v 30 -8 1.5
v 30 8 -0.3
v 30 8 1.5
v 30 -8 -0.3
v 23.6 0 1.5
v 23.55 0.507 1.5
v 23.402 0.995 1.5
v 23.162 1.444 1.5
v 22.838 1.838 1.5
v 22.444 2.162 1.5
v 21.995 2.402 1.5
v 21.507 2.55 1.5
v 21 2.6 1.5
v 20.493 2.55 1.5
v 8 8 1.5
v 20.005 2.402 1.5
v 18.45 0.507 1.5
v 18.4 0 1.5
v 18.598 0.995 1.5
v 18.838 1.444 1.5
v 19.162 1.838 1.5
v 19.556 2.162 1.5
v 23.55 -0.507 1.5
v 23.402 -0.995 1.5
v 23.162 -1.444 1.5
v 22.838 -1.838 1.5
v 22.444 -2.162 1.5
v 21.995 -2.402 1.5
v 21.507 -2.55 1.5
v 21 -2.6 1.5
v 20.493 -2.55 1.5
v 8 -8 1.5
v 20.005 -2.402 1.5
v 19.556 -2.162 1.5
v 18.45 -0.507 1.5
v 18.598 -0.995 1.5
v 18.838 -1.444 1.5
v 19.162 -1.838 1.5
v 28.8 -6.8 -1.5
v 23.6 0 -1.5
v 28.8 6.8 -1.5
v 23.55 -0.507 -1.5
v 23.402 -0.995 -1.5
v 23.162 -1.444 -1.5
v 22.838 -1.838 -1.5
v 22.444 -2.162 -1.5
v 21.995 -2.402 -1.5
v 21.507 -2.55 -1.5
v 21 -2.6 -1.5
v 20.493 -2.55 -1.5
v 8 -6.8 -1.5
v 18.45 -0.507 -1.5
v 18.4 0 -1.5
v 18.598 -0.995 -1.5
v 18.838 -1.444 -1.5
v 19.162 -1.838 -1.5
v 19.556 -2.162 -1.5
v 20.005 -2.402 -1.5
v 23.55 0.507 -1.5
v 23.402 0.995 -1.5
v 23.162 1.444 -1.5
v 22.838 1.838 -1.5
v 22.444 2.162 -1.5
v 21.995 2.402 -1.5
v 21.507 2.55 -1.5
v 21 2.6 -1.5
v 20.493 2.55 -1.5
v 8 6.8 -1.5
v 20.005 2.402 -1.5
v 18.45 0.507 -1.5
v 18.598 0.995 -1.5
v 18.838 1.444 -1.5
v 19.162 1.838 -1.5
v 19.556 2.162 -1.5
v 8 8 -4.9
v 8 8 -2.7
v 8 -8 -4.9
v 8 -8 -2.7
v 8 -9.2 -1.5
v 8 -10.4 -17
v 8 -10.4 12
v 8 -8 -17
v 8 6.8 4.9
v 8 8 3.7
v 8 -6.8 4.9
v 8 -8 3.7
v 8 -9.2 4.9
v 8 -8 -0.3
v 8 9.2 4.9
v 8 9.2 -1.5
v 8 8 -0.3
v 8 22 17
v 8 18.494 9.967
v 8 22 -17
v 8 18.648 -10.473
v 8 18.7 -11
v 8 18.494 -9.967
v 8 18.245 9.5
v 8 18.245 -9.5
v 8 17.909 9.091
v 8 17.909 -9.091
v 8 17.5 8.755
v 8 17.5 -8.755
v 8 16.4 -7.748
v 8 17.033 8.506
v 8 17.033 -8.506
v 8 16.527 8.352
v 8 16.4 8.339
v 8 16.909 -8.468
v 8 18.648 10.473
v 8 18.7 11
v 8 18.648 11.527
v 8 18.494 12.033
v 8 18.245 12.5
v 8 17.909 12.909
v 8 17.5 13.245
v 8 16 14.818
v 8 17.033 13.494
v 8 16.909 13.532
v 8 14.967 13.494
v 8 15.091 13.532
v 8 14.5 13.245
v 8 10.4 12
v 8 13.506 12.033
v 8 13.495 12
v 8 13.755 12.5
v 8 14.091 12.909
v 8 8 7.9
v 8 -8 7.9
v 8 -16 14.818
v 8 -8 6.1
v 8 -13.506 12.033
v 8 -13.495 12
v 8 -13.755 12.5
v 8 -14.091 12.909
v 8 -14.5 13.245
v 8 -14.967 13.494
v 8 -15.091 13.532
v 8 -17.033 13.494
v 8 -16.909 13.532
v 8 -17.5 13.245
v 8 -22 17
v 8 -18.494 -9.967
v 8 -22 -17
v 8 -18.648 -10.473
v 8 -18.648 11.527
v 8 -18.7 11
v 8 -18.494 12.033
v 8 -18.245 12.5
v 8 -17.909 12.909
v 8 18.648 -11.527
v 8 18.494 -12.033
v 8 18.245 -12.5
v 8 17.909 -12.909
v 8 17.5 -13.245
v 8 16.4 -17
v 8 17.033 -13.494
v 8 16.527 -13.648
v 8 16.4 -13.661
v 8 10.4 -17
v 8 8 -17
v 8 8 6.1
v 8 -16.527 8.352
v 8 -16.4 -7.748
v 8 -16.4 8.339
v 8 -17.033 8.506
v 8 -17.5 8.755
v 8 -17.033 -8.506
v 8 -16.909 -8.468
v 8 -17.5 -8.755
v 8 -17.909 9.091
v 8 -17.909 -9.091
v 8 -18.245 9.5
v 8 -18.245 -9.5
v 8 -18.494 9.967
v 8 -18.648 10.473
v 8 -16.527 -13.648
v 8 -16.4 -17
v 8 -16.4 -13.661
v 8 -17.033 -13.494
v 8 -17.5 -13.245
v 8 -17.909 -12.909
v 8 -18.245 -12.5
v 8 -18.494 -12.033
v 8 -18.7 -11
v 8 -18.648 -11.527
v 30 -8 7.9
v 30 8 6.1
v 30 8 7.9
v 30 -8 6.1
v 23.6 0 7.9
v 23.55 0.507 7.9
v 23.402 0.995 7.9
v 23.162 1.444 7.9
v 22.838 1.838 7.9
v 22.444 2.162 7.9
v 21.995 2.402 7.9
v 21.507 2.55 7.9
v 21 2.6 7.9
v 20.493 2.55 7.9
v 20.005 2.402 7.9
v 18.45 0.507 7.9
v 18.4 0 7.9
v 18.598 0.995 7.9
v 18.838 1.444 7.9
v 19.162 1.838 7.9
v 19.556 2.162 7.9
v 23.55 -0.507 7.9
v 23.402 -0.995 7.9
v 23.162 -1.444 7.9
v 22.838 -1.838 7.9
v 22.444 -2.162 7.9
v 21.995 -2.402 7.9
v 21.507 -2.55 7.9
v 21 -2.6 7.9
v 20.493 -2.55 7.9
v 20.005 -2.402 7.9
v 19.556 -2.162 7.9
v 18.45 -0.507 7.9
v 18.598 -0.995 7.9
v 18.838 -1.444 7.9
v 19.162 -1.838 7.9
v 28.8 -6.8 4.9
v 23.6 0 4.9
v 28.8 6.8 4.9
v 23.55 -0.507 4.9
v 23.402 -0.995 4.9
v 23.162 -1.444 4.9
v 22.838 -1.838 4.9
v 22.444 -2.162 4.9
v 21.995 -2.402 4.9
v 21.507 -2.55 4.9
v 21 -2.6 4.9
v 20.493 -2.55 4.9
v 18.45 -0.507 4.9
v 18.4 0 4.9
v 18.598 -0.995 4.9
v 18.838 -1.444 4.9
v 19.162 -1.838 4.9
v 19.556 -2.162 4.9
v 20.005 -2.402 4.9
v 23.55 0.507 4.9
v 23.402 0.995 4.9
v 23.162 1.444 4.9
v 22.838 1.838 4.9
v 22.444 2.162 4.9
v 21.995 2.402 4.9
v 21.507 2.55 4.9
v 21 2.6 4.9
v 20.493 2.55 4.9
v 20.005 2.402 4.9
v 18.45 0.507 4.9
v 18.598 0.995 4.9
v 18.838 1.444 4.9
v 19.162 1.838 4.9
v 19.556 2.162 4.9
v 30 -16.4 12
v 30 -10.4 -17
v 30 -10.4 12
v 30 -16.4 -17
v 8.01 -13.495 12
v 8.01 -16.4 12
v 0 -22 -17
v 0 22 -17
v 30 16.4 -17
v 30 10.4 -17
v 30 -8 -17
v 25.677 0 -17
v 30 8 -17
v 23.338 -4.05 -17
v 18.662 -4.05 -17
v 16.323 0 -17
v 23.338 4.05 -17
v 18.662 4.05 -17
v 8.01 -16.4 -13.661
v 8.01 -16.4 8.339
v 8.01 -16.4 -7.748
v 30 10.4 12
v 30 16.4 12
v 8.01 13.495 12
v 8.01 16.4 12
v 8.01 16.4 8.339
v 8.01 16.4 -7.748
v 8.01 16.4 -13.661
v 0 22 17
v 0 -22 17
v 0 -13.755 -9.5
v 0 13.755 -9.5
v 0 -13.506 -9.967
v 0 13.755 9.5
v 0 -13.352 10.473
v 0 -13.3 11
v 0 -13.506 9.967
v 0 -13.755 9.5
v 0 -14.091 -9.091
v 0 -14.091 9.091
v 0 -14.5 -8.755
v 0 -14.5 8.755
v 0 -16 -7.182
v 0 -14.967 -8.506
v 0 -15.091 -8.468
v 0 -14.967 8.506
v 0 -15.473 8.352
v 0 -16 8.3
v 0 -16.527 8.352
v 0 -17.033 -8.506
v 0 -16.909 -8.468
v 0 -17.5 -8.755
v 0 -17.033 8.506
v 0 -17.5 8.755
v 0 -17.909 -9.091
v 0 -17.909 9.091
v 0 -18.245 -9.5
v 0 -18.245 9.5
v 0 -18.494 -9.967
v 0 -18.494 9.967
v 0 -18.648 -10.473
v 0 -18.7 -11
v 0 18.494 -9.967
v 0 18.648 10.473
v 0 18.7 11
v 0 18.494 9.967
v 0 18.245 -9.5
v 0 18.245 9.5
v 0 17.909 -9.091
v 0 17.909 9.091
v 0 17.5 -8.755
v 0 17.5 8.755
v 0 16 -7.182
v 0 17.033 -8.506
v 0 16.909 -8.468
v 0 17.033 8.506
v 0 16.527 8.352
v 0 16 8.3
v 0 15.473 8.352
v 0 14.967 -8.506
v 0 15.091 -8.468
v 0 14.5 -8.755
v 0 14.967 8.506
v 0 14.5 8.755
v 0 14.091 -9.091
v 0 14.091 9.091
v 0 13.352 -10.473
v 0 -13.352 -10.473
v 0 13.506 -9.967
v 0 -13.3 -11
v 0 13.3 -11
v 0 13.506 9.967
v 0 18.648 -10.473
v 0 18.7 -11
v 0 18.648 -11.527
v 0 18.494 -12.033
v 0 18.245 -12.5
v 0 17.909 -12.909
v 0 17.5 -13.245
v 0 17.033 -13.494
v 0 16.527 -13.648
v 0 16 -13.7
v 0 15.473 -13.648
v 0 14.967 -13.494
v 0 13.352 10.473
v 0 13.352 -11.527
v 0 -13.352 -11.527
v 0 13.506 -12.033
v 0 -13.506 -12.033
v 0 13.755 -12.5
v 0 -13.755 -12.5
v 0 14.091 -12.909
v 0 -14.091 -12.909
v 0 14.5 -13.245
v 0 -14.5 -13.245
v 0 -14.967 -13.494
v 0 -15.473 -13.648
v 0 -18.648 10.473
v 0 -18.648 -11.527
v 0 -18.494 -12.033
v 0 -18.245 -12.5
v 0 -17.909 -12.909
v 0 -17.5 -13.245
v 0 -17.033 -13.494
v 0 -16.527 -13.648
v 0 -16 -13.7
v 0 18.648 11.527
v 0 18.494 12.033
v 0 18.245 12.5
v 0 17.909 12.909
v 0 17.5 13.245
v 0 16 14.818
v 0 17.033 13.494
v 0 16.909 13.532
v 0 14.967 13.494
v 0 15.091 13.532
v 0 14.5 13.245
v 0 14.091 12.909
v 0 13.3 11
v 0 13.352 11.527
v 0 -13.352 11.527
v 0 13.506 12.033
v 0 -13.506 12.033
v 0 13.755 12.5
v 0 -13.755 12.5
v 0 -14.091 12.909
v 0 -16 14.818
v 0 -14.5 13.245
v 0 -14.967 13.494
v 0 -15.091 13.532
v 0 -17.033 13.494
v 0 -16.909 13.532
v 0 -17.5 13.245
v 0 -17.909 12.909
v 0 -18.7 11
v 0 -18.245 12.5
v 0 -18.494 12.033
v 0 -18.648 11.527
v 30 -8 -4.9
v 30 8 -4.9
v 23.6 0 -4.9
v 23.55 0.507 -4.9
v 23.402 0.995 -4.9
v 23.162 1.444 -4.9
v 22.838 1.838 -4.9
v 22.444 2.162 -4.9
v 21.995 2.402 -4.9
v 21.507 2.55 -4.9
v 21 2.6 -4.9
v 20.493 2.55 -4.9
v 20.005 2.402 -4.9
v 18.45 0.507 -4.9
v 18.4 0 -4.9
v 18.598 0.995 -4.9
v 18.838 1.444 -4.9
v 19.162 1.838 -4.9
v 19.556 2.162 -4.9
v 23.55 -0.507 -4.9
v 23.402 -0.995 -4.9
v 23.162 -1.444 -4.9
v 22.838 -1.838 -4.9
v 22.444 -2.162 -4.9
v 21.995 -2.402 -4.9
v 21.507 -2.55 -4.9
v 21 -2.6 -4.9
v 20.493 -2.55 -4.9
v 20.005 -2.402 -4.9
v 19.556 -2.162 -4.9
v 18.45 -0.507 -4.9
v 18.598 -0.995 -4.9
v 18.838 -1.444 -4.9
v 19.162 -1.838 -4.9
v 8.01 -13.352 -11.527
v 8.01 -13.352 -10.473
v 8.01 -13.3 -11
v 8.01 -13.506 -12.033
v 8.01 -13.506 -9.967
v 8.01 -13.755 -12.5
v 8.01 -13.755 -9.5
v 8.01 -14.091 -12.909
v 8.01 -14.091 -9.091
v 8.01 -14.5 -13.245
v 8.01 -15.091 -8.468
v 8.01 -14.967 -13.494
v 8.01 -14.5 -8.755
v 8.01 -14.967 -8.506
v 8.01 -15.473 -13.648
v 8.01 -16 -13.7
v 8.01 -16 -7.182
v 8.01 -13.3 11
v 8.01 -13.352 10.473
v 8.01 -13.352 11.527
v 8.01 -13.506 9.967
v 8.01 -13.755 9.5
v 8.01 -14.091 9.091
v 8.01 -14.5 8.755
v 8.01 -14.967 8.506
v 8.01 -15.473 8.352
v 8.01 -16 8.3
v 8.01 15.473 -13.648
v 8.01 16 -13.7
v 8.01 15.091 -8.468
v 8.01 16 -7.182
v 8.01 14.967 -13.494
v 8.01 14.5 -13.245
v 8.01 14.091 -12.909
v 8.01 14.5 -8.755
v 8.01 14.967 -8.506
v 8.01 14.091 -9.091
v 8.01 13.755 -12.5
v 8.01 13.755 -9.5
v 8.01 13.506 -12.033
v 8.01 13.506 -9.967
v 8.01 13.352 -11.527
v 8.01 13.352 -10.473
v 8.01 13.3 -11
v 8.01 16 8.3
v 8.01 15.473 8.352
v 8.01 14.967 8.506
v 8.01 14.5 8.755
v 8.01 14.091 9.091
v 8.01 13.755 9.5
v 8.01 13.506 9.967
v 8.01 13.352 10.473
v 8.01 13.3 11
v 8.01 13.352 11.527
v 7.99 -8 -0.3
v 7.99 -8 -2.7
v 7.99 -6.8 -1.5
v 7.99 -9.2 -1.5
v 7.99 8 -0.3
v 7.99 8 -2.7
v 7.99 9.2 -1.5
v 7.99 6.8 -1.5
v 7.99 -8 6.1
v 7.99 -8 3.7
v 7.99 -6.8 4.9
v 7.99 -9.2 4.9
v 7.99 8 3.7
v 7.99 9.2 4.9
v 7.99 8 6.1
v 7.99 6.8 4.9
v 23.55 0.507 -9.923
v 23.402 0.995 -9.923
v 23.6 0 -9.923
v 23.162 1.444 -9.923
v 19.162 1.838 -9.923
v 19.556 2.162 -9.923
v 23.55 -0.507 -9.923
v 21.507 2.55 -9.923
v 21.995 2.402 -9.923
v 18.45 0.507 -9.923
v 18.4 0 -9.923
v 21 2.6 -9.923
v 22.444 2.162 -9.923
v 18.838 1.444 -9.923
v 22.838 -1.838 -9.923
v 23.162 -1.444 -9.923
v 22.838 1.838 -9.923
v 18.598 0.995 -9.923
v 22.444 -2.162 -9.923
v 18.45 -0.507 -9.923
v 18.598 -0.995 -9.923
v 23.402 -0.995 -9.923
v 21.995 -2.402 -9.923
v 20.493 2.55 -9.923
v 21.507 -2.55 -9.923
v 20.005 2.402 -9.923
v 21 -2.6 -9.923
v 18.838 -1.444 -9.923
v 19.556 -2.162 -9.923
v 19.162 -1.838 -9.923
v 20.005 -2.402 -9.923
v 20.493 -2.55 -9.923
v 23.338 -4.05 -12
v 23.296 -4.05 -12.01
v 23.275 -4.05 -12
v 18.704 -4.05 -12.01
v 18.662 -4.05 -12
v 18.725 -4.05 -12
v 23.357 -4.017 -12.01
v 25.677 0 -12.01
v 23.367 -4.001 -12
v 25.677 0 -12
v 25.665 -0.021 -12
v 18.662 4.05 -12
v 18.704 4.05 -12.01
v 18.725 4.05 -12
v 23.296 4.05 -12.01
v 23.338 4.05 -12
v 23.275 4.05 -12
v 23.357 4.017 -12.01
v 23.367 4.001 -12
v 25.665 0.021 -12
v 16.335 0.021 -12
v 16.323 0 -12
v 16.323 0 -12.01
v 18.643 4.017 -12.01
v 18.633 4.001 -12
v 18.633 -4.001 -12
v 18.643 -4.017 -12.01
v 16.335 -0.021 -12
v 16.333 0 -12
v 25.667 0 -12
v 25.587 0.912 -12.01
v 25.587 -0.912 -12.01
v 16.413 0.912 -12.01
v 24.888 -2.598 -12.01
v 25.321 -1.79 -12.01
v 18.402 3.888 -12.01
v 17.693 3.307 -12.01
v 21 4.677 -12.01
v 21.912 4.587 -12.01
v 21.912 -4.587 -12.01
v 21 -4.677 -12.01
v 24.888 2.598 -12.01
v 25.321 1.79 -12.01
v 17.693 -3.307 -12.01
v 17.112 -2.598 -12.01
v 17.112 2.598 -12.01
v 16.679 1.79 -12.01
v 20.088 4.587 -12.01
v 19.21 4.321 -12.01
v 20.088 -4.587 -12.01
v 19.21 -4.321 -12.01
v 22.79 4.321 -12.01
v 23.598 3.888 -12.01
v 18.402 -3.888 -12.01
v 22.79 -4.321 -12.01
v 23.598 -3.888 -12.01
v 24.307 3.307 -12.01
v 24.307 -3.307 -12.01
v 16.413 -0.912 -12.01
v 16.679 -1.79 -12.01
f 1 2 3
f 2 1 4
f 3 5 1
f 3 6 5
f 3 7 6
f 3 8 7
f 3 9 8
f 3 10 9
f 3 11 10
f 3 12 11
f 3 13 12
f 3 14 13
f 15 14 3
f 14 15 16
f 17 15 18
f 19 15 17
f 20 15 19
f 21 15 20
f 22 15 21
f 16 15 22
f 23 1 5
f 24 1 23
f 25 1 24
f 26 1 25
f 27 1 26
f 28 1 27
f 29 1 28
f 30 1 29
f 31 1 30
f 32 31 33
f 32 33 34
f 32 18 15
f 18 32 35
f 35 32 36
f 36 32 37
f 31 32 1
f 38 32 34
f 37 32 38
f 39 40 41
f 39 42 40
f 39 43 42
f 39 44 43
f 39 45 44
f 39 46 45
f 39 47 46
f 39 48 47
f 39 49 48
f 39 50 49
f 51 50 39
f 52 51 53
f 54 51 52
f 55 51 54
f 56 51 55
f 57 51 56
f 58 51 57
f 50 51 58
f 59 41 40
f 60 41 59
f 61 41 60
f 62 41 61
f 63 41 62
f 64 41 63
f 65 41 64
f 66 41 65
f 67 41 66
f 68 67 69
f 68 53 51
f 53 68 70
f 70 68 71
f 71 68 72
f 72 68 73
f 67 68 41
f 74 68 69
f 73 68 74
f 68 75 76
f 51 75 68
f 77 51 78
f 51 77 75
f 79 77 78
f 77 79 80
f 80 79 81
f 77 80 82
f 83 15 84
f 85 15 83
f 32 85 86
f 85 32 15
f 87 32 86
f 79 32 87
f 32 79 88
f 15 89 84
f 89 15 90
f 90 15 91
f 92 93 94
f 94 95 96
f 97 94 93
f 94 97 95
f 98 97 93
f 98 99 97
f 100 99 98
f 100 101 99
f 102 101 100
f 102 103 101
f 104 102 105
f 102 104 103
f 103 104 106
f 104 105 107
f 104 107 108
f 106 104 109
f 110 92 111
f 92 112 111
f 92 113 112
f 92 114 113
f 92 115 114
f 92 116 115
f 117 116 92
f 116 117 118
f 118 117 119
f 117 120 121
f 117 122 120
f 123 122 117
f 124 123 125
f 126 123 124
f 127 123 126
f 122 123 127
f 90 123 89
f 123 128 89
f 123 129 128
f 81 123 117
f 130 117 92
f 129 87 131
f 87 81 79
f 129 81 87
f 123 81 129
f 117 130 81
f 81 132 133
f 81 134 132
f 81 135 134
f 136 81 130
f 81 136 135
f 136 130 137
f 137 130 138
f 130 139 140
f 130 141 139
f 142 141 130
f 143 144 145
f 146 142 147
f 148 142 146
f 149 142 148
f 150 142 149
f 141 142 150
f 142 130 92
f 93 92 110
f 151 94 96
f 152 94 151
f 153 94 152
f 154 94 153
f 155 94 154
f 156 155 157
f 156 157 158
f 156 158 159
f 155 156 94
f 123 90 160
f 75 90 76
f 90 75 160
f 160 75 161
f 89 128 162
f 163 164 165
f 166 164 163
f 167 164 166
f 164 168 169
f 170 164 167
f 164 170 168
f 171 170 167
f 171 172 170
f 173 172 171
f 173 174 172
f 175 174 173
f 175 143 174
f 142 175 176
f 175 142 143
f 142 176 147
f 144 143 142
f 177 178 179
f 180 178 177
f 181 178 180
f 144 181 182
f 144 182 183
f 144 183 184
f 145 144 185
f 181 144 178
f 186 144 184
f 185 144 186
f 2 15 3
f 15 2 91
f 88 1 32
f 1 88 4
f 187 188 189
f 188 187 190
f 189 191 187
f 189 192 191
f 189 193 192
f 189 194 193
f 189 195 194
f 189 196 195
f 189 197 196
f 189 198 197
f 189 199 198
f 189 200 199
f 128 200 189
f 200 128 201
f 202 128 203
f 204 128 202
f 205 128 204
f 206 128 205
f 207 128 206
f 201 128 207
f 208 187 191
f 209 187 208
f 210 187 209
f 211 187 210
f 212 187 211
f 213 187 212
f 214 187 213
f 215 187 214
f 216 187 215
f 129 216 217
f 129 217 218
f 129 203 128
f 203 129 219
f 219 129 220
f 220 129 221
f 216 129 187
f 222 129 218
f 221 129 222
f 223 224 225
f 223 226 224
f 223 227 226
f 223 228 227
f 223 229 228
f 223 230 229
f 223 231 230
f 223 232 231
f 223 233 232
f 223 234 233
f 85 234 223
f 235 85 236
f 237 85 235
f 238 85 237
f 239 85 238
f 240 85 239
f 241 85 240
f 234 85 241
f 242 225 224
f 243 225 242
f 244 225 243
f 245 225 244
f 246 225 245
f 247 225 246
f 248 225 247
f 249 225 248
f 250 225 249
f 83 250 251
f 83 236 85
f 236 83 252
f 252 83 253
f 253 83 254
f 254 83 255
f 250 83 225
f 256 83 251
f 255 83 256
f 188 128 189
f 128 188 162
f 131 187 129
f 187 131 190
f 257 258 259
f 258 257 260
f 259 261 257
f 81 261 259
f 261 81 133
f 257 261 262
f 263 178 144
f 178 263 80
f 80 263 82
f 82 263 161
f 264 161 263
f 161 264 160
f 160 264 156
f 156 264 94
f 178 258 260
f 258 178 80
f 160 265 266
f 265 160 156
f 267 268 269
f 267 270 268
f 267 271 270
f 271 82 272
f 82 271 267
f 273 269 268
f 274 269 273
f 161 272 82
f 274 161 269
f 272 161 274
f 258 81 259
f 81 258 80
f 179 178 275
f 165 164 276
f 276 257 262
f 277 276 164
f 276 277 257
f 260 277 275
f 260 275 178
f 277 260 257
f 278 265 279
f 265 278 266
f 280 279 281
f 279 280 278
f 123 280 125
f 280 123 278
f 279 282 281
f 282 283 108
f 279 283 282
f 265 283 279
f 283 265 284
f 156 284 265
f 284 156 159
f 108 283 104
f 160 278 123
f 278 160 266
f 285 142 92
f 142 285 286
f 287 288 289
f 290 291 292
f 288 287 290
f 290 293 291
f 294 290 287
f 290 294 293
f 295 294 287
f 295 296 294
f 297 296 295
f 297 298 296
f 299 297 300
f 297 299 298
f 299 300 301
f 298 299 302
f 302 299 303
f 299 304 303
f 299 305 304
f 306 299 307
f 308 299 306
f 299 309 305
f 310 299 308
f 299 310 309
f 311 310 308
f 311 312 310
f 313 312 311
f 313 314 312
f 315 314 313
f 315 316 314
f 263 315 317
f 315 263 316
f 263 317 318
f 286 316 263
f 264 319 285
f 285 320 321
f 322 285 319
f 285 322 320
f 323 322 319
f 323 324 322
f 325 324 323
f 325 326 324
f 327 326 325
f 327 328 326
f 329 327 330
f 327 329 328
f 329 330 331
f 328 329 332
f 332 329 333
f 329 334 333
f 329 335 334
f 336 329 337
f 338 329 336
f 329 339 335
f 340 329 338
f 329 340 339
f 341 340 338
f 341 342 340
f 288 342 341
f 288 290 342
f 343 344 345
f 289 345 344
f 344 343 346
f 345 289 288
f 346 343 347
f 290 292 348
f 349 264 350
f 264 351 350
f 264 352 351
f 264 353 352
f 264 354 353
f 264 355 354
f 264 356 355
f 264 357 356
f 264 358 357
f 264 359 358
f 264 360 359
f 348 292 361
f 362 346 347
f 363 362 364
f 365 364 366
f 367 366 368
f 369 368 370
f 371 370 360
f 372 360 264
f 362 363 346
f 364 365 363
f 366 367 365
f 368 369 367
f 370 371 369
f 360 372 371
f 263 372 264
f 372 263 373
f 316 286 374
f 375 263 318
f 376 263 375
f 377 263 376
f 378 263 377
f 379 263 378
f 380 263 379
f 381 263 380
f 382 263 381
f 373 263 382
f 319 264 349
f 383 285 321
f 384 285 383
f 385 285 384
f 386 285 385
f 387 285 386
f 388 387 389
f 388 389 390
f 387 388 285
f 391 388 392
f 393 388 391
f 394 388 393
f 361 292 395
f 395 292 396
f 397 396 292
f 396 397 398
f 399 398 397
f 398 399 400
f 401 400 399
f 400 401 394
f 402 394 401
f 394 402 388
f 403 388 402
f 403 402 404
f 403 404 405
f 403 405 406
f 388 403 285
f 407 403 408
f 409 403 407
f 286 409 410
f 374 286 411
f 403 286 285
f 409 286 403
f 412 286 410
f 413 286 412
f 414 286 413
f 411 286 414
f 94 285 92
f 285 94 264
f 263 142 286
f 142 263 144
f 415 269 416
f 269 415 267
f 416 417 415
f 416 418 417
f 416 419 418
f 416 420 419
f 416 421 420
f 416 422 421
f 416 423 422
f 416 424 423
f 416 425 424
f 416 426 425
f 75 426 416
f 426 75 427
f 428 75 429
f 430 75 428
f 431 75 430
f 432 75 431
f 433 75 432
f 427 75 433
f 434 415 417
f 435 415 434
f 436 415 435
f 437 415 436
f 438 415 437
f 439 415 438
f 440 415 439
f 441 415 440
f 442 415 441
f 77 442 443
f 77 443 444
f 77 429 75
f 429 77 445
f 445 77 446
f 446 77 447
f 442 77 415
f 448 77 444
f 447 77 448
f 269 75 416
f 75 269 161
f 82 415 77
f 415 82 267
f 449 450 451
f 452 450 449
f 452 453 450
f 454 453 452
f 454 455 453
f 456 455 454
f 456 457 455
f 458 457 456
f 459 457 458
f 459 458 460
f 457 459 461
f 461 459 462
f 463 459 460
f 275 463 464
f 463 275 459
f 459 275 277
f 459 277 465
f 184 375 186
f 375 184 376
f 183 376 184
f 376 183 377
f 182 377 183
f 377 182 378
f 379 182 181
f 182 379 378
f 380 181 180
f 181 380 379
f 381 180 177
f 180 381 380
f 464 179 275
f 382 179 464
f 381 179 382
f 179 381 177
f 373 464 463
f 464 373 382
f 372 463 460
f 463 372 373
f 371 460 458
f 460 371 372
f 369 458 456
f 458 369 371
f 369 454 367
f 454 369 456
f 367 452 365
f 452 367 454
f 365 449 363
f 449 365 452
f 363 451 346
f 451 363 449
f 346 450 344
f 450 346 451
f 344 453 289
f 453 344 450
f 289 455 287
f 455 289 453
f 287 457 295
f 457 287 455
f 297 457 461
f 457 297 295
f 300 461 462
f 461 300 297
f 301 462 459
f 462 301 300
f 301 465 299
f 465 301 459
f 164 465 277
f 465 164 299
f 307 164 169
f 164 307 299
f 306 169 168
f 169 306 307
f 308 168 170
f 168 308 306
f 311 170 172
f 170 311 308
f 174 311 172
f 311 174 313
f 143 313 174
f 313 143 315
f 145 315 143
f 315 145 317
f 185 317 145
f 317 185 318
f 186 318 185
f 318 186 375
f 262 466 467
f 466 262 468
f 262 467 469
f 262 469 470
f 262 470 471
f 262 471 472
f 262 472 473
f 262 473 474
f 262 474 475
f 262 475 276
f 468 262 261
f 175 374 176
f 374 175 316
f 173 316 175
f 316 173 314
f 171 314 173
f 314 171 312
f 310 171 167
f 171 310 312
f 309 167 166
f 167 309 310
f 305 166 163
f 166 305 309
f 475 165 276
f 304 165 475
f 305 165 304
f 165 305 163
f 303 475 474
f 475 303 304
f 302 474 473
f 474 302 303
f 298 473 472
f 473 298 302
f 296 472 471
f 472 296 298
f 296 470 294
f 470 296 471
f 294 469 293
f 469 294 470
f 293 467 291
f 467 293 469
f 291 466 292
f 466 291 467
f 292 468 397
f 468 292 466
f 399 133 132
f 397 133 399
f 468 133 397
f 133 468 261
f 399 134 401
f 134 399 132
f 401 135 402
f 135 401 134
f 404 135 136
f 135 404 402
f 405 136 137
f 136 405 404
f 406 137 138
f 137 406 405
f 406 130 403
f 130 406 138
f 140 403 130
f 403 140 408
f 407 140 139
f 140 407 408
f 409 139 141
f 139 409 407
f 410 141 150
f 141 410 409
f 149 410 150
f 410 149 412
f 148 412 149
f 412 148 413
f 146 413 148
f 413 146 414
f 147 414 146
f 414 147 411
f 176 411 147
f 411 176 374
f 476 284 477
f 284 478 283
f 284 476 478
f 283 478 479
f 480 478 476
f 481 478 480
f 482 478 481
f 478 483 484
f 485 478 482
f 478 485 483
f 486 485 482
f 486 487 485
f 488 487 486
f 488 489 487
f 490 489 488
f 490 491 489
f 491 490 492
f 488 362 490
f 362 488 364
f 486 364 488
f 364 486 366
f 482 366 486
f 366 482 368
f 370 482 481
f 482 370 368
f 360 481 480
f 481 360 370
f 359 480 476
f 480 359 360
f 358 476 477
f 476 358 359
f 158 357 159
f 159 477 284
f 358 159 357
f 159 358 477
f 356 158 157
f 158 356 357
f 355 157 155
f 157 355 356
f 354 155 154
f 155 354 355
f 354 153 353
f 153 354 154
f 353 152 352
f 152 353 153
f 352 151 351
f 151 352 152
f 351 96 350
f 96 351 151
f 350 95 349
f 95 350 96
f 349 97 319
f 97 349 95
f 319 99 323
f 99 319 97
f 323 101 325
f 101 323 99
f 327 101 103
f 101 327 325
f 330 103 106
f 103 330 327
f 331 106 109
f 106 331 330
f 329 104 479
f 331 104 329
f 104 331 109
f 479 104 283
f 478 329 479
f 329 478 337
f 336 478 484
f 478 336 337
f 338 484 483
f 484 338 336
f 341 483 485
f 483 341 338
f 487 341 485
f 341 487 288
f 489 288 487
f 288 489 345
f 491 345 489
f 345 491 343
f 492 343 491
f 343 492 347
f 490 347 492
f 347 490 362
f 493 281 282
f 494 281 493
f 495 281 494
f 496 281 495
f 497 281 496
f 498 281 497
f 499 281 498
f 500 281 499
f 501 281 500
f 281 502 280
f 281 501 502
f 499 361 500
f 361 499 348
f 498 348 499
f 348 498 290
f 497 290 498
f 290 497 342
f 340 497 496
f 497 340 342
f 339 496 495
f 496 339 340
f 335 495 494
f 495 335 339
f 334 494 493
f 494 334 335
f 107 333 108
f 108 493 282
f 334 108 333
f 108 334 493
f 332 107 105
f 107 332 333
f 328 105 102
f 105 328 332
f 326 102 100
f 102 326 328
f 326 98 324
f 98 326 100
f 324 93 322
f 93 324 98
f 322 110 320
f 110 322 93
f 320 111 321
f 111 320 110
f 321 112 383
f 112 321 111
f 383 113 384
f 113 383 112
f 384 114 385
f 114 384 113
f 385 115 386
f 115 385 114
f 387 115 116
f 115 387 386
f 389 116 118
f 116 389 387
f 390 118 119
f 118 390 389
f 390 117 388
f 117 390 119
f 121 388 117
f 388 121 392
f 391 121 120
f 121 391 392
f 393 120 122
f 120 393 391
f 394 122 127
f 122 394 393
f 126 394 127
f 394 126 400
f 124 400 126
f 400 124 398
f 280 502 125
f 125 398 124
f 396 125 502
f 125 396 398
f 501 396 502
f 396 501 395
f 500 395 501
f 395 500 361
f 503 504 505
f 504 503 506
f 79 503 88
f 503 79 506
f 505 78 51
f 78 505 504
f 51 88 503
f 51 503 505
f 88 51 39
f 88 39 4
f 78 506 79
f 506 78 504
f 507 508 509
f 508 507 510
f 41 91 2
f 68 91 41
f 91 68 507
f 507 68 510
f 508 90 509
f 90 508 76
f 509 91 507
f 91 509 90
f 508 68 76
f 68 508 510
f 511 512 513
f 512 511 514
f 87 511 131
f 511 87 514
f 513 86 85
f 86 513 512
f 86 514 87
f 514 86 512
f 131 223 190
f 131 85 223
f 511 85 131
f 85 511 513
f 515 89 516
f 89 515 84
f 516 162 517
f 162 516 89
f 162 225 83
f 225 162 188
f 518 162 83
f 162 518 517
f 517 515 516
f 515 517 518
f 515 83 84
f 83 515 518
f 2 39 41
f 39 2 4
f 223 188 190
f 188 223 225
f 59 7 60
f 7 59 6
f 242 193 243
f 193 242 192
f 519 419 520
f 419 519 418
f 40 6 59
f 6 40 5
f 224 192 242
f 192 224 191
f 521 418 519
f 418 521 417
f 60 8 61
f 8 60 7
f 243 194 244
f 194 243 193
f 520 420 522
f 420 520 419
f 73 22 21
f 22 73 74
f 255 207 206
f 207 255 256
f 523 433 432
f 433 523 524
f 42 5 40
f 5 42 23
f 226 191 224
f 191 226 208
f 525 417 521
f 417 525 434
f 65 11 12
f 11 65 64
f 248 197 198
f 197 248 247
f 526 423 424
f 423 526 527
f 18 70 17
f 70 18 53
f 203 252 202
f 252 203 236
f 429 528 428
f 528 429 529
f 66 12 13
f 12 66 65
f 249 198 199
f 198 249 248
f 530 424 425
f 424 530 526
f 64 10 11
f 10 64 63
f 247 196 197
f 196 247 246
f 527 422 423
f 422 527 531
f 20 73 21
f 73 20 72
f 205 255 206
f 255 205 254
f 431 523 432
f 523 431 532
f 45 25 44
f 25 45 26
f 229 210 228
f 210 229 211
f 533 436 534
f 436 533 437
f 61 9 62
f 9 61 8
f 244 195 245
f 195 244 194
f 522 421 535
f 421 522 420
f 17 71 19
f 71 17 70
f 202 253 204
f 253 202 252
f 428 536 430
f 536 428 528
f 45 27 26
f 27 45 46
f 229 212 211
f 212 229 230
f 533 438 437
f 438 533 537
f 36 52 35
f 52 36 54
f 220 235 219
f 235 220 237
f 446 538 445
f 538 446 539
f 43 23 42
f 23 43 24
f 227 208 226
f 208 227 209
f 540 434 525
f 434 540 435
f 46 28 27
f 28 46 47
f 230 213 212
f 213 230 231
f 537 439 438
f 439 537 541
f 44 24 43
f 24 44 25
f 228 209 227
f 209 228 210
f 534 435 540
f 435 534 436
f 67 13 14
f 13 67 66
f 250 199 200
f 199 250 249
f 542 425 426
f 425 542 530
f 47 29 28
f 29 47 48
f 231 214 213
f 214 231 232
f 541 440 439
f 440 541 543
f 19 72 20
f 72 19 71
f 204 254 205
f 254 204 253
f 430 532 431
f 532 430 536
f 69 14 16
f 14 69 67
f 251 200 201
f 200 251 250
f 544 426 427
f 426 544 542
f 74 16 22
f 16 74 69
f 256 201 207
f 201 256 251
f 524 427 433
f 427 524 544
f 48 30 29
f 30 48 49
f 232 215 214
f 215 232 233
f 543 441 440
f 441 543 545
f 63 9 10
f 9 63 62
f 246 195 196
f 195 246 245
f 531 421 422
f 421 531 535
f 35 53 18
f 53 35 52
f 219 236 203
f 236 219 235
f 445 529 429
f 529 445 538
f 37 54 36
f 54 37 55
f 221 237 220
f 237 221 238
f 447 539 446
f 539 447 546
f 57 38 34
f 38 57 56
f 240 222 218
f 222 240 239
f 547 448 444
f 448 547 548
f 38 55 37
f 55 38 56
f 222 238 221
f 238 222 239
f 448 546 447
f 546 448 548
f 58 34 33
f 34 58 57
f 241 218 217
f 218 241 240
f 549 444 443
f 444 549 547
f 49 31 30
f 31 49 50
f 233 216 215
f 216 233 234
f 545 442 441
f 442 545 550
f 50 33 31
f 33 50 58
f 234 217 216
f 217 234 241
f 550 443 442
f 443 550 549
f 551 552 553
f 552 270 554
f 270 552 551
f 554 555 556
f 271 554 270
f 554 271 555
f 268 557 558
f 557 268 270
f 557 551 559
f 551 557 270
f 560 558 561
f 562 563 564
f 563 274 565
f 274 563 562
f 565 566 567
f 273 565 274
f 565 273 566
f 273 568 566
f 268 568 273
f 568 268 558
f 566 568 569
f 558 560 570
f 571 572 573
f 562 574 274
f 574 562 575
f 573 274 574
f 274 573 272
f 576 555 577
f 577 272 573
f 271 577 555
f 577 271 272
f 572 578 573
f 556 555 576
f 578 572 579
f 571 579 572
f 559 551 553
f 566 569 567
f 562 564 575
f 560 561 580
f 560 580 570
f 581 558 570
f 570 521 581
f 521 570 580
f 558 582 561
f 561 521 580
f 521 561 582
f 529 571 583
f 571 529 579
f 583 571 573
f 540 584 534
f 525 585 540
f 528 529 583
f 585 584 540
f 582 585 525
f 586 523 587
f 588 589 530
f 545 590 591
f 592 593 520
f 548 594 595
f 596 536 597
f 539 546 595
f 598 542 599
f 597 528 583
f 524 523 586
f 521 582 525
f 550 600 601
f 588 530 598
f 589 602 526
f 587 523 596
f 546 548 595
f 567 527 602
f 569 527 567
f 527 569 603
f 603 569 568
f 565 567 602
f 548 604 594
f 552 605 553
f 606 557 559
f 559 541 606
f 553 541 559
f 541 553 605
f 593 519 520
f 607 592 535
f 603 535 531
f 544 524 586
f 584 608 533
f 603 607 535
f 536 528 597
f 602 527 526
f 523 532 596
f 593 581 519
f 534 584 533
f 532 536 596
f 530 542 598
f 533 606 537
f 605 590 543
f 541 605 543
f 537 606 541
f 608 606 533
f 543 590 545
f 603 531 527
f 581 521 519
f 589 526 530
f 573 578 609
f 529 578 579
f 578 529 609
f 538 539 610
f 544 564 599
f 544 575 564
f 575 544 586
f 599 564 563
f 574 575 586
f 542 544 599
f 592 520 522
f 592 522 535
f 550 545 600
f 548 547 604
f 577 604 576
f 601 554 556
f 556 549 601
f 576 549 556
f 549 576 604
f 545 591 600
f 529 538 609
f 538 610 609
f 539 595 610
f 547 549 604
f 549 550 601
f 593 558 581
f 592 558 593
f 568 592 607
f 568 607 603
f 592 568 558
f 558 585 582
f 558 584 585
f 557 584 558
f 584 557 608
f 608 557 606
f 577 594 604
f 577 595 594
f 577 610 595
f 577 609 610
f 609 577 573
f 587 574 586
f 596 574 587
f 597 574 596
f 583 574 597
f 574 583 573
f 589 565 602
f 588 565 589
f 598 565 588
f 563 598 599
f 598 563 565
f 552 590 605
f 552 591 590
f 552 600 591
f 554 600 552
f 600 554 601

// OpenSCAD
// =====================================================================
// child_cam_mount.scad — 子機 カメラマウント (縦向き防水ケース用)
//
// DJI Osmo Action 6 を純正防水ケースに入れたまま「縦向き (ポートレート)」に
// 保持する小部品。ケース底面の DJI クイックリリース デュアルタブ
// (GoPro 2 フィンガー互換) を本部品の 3 フィンガーで受け、M5 ボルト 1 本で
// 締結する。ケース底面はフィンガー脇の 2 本の柱の前面 (レジスタ面) に
// 突き当たり、ヨー/ピッチの再現性を出す。
//
// 縦向き配置: ケース底面 (タブ側) は機体中心を向く (内向き)。左右のカメラで
// 同一部品を使う (本部品は y=0 面に対して対称)。
// コアフレーム側インタフェース: 背面プレートの M5 ×4 (y=±16, z=±11)。
//
// ★ 寸法はすべて公称/推定の仮値 (2026-08-02 ユーザ指示: 実測は後日)。
//   実測後に [防水ケース] ブロックを置換して再ビルドすること。
//
// 座標系 (部品ローカル): +X = ケース側 (機体では内→外)、+Y = 前 (レンズ向き)、
//   +Z = 上。背面プレートの背面が x=0。
// 印刷向き: このまま (z=-17 の底面をベッドへ)。フィンガーの間隙 3.4mm は
//   16mm ブリッジで printable (タブ側クリアランス 0.4 が垂れを吸収)。
//   荷重 (カメラ慣性によるフィンガー曲げ) の引張は XY 面内。
// 荷重ケース: L2 輸送 = カメラ+ケース 0.26 kg × 10g ≈ 26 N (全方向)。
//   quick_strength beam (b=48,t=3,L=20,F=30): 8.3 MPa / 許容 12 → PASS
//   quick_strength lug  (hole=5.2,t=9,F=60): 面圧 1.3 MPa → PASS
// =====================================================================

/* [防水ケース (公称・仮値 — 要実測)] */
case_w    = 94.7;    // ケース幅 (縦向きでは Z 方向 = 上下)
case_h    = 84.1;    // ケース高さ (縦向きでは X 方向 = 基線方向)
case_d    = 45.9;    // ケース奥行 (レンズ軸 Y 方向)
lens_off_bot = 42.05; // レジスタ面 (fin_x1, ケース底面の突き当て) →レンズ軸の距離。
                      // 仮 = case_h/2。要実測。★横向き搭載 (child_cam_bridge) でも
                      // 同じ定義で使う (デッキ高さ導出は bridge 側で
                      // deck_top = lens_z - lens_off_bot - fin_x1 として計算する)

/* [クイックリリース タブ (GoPro 互換想定・仮値 — 要実測)] */
tab_t     = 3.0;     // ケース側タブ 1 枚の厚さ
tab_w     = 16.0;    // タブ幅 (Y 方向)
tab_len   = 18.0;    // ケース底面からのタブ突出量
tab_hole_off = 9.0;  // ケース底面 → タブ穴中心の距離 (仮)
tab_clr   = 0.4;     // タブ厚に対する間隙の遊び

/* [フィンガー] */
fin_t     = 3.0;     // 本部品フィンガー厚
fin_w     = 16.0;    // フィンガー幅 (Y)
fin_len   = 22.0;    // フィンガー長 (X)。タブ 18 より長くして頭の逃げを作る
bolt_d    = 5.2;     // M5 通し
hex_af    = 8.1;     // M5 ナットトラップ 二面幅 (+0.1)
hex_dep   = 5.0;

/* [背面プレート (コアフレームへ M5 ×4)] */
plate_t   = 8.0;
plate_hw  = 22.0;    // 半幅 (Y)
plate_hh  = 17.0;    // 半高 (Z)
fh_y      = 16.0;    // フレーム穴 Y 位置 (±)
fh_z      = 11.0;    // フレーム穴 Z 位置 (±)
m5_d      = 5.4;     // M5 クリアランス

/* [レジスタ柱 (ケース底面の突き当て)] */
post_w    = 6.0;     // 柱の幅 (Y)
post_gap  = 2.4;     // フィンガー側面 → 柱内面のクリアランス
post_top  = 12.0;    // 柱の上端 z

/* [機体レベル検査 (仮値)] */
base_line = 150.0;   // ステレオ基線
env_half  = 140.0;   // 全幅 280 の半分 (2026-09-04 子機外装_改善要件 C5/C8: 250→280 に緩和)
bumper_min = 5.0;    // 外側に残す保護構造の最小代 (旧・縦向き検査用、現在は未使用)
bumper_t  = 9.0;     // child_side_bumper の板厚 (二重定義: child_side_bumper.scad と揃える)

/* [Hidden] */
fudge = 0.01;

// ---- 導出値 ---------------------------------------------------------
gap_t    = tab_t + tab_clr;               // フィンガー間隙 3.4
fin_x0   = plate_t;                       // フィンガー根元
fin_x1   = plate_t + fin_len;             // フィンガー先端 = レジスタ面
bolt_x   = fin_x1 - tab_hole_off;         // タブ穴と揃う M5 位置
stack_h  = 3*fin_t + 2*gap_t;             // 15.8
fin_zc   = [-(fin_t+gap_t), 0, fin_t+gap_t]; // フィンガー中心 z (-6.4/0/+6.4)
ped_top  = fin_zc[0] - fin_t/2;           // 台座上面 = 最下フィンガー下面 (-7.9)
post_y0  = fin_w/2 + post_gap;            // 柱内面 (10.4)
post_y1  = post_y0 + post_w;              // 柱外面 (16.4)
head_d   = 16.0;                          // M5 ノブ頭の想定径 (工具レス)
cam_outer = base_line/2 + (case_h - lens_off_bot); // レンズ外側のケース張り出し

// ---- 干渉・成立性チェック -------------------------------------------
assert(gap_t >= tab_t + 0.3,               "フィンガー間隙がタブ厚+0.3を下回る");
assert(fin_len > tab_len + 2,              "フィンガーがタブより短い (頭の逃げ不足)");
assert(bolt_x - head_d/2 > plate_t + 1,    "M5 ノブ頭が背面プレートに当たる");
assert(fin_w/2 - bolt_d/2 >= 2,            "フィンガーの穴縁距離 < 2mm");
assert(fin_w/2 > hex_af/2 + 2,             "ナットトラップの側壁 < 2mm");
assert(plate_hw - fh_y >= m5_d,            "フレーム穴の Y 端距離不足");
assert(plate_hh - fh_z >= m5_d,            "フレーム穴の Z 端距離不足");
assert(post_y1 <= plate_hw,                "レジスタ柱がプレートからはみ出す");
assert(case_d/2 <= plate_hw + 1,           "ケース底面が柱で受けきれない (目安)");
// 250 枠検査 (縦向き搭載時代のもの) は横向き復帰 (C8) により無効。
// 280 枠検査 (横向き, 2026-09-04 改善要件 §1 C5/C8, §3.2):
//   base_line/2 + case_w/2 + bumper_t <= env_half
assert(base_line/2 + case_w/2 + bumper_t <= env_half,
       "横向き搭載でケース+側面バンパが 280 枠を超える");
echo(str("機体でのケース外側張り出し |X| (横向き, バンパ込み) = ",
         base_line/2 + case_w/2 + bumper_t, " (枠 ", env_half, ")"));
echo(str("レジスタ面のグローバル |X| = ", base_line/2 - lens_off_bot,
         " → プレート背面 |X| = ", base_line/2 - lens_off_bot - fin_x1));

// ---- モジュール -----------------------------------------------------
cham = 1.2;   // フィンガー下面縁の 45° 面取り (オーバーハング面積の削減)

// 稜線上のダイヤモンド断面カッター (軸 = X)。稜の両面に c の 45° 面取りを作る
module edge_cham_x(len, c) {
    s = c * sqrt(2);
    rotate([45, 0, 0]) translate([0, -s/2, -s/2]) cube([len, s, s]);
}
// 同、軸 = Y
module edge_cham_y(len, c) {
    s = c * sqrt(2);
    rotate([0, 45, 0]) translate([-s/2, 0, -s/2]) cube([s, len, s]);
}

// 水平穴 (軸 +X) のティアドロップ: 45° 屋根で自己支持にする (サポートレス規約)
module td_hole_x(d, h) {
    r = d/2;
    rotate([0, 90, 0]) linear_extrude(height = h)
        union() {
            circle(r = r, $fn = 32);
            polygon([[-1.414*r, 0], [0, r], [0, -r]]);
        }
}

// ---- 形状 -----------------------------------------------------------
difference() {
    union() {
        // 背面プレート
        translate([0, -plate_hw, -plate_hh])
            cube([plate_t, 2*plate_hw, 2*plate_hh]);
        // 台座 (最下フィンガーを兼ねてベッドまで下ろす)
        translate([fin_x0, -fin_w/2, -plate_hh])
            cube([fin_len, fin_w, ped_top + plate_hh + fin_t]);
        // 中・上フィンガー
        for (i = [1, 2])
            translate([fin_x0, -fin_w/2, fin_zc[i] - fin_t/2])
                cube([fin_len, fin_w, fin_t]);
        // レジスタ柱 ×2 (前面 = ケース底面の突き当て面)
        for (s = [-1, 1])
            translate([fin_x0, s == 1 ? post_y0 : -post_y1, -plate_hh])
                cube([fin_len, post_w, post_top + plate_hh]);
    }
    // フレーム M5 ×4 (ティアドロップ: 横穴の天井を 45° に)
    for (sy = [-1, 1], sz = [-1, 1])
        translate([-fudge, sy*fh_y, sz*fh_z])
            td_hole_x(m5_d, plate_t + 2*fudge);
    // タブ M5 (垂直通し)
    translate([bolt_x, 0, -plate_hh - fudge])
        cylinder(d = bolt_d, h = 2*plate_hh + 2*fudge, $fn = 32);
    // 中・上フィンガー下面の縁を 45° 面取り (±Y の稜と先端 +X の稜)
    for (i = [1, 2]) {
        zb = fin_zc[i] - fin_t/2;
        for (s = [-1, 1])
            translate([fin_x0 - fudge, s*fin_w/2, zb])
                edge_cham_x(fin_len + 2*fudge, cham);
        translate([fin_x1, -fin_w/2 - fudge, zb])
            edge_cham_y(fin_w + 2*fudge, cham);
    }
    // ナットトラップ (底面)。天井は 45° コーンで自己支持にする
    translate([bolt_x, 0, -plate_hh - fudge])
        cylinder(d = hex_af / cos(30), h = hex_dep + fudge, $fn = 6);
    translate([bolt_x, 0, -plate_hh + hex_dep - fudge])
        cylinder(d1 = hex_af / cos(30), d2 = bolt_d,
                 h = (hex_af/cos(30) - bolt_d)/2 + fudge, $fn = 32);
}
